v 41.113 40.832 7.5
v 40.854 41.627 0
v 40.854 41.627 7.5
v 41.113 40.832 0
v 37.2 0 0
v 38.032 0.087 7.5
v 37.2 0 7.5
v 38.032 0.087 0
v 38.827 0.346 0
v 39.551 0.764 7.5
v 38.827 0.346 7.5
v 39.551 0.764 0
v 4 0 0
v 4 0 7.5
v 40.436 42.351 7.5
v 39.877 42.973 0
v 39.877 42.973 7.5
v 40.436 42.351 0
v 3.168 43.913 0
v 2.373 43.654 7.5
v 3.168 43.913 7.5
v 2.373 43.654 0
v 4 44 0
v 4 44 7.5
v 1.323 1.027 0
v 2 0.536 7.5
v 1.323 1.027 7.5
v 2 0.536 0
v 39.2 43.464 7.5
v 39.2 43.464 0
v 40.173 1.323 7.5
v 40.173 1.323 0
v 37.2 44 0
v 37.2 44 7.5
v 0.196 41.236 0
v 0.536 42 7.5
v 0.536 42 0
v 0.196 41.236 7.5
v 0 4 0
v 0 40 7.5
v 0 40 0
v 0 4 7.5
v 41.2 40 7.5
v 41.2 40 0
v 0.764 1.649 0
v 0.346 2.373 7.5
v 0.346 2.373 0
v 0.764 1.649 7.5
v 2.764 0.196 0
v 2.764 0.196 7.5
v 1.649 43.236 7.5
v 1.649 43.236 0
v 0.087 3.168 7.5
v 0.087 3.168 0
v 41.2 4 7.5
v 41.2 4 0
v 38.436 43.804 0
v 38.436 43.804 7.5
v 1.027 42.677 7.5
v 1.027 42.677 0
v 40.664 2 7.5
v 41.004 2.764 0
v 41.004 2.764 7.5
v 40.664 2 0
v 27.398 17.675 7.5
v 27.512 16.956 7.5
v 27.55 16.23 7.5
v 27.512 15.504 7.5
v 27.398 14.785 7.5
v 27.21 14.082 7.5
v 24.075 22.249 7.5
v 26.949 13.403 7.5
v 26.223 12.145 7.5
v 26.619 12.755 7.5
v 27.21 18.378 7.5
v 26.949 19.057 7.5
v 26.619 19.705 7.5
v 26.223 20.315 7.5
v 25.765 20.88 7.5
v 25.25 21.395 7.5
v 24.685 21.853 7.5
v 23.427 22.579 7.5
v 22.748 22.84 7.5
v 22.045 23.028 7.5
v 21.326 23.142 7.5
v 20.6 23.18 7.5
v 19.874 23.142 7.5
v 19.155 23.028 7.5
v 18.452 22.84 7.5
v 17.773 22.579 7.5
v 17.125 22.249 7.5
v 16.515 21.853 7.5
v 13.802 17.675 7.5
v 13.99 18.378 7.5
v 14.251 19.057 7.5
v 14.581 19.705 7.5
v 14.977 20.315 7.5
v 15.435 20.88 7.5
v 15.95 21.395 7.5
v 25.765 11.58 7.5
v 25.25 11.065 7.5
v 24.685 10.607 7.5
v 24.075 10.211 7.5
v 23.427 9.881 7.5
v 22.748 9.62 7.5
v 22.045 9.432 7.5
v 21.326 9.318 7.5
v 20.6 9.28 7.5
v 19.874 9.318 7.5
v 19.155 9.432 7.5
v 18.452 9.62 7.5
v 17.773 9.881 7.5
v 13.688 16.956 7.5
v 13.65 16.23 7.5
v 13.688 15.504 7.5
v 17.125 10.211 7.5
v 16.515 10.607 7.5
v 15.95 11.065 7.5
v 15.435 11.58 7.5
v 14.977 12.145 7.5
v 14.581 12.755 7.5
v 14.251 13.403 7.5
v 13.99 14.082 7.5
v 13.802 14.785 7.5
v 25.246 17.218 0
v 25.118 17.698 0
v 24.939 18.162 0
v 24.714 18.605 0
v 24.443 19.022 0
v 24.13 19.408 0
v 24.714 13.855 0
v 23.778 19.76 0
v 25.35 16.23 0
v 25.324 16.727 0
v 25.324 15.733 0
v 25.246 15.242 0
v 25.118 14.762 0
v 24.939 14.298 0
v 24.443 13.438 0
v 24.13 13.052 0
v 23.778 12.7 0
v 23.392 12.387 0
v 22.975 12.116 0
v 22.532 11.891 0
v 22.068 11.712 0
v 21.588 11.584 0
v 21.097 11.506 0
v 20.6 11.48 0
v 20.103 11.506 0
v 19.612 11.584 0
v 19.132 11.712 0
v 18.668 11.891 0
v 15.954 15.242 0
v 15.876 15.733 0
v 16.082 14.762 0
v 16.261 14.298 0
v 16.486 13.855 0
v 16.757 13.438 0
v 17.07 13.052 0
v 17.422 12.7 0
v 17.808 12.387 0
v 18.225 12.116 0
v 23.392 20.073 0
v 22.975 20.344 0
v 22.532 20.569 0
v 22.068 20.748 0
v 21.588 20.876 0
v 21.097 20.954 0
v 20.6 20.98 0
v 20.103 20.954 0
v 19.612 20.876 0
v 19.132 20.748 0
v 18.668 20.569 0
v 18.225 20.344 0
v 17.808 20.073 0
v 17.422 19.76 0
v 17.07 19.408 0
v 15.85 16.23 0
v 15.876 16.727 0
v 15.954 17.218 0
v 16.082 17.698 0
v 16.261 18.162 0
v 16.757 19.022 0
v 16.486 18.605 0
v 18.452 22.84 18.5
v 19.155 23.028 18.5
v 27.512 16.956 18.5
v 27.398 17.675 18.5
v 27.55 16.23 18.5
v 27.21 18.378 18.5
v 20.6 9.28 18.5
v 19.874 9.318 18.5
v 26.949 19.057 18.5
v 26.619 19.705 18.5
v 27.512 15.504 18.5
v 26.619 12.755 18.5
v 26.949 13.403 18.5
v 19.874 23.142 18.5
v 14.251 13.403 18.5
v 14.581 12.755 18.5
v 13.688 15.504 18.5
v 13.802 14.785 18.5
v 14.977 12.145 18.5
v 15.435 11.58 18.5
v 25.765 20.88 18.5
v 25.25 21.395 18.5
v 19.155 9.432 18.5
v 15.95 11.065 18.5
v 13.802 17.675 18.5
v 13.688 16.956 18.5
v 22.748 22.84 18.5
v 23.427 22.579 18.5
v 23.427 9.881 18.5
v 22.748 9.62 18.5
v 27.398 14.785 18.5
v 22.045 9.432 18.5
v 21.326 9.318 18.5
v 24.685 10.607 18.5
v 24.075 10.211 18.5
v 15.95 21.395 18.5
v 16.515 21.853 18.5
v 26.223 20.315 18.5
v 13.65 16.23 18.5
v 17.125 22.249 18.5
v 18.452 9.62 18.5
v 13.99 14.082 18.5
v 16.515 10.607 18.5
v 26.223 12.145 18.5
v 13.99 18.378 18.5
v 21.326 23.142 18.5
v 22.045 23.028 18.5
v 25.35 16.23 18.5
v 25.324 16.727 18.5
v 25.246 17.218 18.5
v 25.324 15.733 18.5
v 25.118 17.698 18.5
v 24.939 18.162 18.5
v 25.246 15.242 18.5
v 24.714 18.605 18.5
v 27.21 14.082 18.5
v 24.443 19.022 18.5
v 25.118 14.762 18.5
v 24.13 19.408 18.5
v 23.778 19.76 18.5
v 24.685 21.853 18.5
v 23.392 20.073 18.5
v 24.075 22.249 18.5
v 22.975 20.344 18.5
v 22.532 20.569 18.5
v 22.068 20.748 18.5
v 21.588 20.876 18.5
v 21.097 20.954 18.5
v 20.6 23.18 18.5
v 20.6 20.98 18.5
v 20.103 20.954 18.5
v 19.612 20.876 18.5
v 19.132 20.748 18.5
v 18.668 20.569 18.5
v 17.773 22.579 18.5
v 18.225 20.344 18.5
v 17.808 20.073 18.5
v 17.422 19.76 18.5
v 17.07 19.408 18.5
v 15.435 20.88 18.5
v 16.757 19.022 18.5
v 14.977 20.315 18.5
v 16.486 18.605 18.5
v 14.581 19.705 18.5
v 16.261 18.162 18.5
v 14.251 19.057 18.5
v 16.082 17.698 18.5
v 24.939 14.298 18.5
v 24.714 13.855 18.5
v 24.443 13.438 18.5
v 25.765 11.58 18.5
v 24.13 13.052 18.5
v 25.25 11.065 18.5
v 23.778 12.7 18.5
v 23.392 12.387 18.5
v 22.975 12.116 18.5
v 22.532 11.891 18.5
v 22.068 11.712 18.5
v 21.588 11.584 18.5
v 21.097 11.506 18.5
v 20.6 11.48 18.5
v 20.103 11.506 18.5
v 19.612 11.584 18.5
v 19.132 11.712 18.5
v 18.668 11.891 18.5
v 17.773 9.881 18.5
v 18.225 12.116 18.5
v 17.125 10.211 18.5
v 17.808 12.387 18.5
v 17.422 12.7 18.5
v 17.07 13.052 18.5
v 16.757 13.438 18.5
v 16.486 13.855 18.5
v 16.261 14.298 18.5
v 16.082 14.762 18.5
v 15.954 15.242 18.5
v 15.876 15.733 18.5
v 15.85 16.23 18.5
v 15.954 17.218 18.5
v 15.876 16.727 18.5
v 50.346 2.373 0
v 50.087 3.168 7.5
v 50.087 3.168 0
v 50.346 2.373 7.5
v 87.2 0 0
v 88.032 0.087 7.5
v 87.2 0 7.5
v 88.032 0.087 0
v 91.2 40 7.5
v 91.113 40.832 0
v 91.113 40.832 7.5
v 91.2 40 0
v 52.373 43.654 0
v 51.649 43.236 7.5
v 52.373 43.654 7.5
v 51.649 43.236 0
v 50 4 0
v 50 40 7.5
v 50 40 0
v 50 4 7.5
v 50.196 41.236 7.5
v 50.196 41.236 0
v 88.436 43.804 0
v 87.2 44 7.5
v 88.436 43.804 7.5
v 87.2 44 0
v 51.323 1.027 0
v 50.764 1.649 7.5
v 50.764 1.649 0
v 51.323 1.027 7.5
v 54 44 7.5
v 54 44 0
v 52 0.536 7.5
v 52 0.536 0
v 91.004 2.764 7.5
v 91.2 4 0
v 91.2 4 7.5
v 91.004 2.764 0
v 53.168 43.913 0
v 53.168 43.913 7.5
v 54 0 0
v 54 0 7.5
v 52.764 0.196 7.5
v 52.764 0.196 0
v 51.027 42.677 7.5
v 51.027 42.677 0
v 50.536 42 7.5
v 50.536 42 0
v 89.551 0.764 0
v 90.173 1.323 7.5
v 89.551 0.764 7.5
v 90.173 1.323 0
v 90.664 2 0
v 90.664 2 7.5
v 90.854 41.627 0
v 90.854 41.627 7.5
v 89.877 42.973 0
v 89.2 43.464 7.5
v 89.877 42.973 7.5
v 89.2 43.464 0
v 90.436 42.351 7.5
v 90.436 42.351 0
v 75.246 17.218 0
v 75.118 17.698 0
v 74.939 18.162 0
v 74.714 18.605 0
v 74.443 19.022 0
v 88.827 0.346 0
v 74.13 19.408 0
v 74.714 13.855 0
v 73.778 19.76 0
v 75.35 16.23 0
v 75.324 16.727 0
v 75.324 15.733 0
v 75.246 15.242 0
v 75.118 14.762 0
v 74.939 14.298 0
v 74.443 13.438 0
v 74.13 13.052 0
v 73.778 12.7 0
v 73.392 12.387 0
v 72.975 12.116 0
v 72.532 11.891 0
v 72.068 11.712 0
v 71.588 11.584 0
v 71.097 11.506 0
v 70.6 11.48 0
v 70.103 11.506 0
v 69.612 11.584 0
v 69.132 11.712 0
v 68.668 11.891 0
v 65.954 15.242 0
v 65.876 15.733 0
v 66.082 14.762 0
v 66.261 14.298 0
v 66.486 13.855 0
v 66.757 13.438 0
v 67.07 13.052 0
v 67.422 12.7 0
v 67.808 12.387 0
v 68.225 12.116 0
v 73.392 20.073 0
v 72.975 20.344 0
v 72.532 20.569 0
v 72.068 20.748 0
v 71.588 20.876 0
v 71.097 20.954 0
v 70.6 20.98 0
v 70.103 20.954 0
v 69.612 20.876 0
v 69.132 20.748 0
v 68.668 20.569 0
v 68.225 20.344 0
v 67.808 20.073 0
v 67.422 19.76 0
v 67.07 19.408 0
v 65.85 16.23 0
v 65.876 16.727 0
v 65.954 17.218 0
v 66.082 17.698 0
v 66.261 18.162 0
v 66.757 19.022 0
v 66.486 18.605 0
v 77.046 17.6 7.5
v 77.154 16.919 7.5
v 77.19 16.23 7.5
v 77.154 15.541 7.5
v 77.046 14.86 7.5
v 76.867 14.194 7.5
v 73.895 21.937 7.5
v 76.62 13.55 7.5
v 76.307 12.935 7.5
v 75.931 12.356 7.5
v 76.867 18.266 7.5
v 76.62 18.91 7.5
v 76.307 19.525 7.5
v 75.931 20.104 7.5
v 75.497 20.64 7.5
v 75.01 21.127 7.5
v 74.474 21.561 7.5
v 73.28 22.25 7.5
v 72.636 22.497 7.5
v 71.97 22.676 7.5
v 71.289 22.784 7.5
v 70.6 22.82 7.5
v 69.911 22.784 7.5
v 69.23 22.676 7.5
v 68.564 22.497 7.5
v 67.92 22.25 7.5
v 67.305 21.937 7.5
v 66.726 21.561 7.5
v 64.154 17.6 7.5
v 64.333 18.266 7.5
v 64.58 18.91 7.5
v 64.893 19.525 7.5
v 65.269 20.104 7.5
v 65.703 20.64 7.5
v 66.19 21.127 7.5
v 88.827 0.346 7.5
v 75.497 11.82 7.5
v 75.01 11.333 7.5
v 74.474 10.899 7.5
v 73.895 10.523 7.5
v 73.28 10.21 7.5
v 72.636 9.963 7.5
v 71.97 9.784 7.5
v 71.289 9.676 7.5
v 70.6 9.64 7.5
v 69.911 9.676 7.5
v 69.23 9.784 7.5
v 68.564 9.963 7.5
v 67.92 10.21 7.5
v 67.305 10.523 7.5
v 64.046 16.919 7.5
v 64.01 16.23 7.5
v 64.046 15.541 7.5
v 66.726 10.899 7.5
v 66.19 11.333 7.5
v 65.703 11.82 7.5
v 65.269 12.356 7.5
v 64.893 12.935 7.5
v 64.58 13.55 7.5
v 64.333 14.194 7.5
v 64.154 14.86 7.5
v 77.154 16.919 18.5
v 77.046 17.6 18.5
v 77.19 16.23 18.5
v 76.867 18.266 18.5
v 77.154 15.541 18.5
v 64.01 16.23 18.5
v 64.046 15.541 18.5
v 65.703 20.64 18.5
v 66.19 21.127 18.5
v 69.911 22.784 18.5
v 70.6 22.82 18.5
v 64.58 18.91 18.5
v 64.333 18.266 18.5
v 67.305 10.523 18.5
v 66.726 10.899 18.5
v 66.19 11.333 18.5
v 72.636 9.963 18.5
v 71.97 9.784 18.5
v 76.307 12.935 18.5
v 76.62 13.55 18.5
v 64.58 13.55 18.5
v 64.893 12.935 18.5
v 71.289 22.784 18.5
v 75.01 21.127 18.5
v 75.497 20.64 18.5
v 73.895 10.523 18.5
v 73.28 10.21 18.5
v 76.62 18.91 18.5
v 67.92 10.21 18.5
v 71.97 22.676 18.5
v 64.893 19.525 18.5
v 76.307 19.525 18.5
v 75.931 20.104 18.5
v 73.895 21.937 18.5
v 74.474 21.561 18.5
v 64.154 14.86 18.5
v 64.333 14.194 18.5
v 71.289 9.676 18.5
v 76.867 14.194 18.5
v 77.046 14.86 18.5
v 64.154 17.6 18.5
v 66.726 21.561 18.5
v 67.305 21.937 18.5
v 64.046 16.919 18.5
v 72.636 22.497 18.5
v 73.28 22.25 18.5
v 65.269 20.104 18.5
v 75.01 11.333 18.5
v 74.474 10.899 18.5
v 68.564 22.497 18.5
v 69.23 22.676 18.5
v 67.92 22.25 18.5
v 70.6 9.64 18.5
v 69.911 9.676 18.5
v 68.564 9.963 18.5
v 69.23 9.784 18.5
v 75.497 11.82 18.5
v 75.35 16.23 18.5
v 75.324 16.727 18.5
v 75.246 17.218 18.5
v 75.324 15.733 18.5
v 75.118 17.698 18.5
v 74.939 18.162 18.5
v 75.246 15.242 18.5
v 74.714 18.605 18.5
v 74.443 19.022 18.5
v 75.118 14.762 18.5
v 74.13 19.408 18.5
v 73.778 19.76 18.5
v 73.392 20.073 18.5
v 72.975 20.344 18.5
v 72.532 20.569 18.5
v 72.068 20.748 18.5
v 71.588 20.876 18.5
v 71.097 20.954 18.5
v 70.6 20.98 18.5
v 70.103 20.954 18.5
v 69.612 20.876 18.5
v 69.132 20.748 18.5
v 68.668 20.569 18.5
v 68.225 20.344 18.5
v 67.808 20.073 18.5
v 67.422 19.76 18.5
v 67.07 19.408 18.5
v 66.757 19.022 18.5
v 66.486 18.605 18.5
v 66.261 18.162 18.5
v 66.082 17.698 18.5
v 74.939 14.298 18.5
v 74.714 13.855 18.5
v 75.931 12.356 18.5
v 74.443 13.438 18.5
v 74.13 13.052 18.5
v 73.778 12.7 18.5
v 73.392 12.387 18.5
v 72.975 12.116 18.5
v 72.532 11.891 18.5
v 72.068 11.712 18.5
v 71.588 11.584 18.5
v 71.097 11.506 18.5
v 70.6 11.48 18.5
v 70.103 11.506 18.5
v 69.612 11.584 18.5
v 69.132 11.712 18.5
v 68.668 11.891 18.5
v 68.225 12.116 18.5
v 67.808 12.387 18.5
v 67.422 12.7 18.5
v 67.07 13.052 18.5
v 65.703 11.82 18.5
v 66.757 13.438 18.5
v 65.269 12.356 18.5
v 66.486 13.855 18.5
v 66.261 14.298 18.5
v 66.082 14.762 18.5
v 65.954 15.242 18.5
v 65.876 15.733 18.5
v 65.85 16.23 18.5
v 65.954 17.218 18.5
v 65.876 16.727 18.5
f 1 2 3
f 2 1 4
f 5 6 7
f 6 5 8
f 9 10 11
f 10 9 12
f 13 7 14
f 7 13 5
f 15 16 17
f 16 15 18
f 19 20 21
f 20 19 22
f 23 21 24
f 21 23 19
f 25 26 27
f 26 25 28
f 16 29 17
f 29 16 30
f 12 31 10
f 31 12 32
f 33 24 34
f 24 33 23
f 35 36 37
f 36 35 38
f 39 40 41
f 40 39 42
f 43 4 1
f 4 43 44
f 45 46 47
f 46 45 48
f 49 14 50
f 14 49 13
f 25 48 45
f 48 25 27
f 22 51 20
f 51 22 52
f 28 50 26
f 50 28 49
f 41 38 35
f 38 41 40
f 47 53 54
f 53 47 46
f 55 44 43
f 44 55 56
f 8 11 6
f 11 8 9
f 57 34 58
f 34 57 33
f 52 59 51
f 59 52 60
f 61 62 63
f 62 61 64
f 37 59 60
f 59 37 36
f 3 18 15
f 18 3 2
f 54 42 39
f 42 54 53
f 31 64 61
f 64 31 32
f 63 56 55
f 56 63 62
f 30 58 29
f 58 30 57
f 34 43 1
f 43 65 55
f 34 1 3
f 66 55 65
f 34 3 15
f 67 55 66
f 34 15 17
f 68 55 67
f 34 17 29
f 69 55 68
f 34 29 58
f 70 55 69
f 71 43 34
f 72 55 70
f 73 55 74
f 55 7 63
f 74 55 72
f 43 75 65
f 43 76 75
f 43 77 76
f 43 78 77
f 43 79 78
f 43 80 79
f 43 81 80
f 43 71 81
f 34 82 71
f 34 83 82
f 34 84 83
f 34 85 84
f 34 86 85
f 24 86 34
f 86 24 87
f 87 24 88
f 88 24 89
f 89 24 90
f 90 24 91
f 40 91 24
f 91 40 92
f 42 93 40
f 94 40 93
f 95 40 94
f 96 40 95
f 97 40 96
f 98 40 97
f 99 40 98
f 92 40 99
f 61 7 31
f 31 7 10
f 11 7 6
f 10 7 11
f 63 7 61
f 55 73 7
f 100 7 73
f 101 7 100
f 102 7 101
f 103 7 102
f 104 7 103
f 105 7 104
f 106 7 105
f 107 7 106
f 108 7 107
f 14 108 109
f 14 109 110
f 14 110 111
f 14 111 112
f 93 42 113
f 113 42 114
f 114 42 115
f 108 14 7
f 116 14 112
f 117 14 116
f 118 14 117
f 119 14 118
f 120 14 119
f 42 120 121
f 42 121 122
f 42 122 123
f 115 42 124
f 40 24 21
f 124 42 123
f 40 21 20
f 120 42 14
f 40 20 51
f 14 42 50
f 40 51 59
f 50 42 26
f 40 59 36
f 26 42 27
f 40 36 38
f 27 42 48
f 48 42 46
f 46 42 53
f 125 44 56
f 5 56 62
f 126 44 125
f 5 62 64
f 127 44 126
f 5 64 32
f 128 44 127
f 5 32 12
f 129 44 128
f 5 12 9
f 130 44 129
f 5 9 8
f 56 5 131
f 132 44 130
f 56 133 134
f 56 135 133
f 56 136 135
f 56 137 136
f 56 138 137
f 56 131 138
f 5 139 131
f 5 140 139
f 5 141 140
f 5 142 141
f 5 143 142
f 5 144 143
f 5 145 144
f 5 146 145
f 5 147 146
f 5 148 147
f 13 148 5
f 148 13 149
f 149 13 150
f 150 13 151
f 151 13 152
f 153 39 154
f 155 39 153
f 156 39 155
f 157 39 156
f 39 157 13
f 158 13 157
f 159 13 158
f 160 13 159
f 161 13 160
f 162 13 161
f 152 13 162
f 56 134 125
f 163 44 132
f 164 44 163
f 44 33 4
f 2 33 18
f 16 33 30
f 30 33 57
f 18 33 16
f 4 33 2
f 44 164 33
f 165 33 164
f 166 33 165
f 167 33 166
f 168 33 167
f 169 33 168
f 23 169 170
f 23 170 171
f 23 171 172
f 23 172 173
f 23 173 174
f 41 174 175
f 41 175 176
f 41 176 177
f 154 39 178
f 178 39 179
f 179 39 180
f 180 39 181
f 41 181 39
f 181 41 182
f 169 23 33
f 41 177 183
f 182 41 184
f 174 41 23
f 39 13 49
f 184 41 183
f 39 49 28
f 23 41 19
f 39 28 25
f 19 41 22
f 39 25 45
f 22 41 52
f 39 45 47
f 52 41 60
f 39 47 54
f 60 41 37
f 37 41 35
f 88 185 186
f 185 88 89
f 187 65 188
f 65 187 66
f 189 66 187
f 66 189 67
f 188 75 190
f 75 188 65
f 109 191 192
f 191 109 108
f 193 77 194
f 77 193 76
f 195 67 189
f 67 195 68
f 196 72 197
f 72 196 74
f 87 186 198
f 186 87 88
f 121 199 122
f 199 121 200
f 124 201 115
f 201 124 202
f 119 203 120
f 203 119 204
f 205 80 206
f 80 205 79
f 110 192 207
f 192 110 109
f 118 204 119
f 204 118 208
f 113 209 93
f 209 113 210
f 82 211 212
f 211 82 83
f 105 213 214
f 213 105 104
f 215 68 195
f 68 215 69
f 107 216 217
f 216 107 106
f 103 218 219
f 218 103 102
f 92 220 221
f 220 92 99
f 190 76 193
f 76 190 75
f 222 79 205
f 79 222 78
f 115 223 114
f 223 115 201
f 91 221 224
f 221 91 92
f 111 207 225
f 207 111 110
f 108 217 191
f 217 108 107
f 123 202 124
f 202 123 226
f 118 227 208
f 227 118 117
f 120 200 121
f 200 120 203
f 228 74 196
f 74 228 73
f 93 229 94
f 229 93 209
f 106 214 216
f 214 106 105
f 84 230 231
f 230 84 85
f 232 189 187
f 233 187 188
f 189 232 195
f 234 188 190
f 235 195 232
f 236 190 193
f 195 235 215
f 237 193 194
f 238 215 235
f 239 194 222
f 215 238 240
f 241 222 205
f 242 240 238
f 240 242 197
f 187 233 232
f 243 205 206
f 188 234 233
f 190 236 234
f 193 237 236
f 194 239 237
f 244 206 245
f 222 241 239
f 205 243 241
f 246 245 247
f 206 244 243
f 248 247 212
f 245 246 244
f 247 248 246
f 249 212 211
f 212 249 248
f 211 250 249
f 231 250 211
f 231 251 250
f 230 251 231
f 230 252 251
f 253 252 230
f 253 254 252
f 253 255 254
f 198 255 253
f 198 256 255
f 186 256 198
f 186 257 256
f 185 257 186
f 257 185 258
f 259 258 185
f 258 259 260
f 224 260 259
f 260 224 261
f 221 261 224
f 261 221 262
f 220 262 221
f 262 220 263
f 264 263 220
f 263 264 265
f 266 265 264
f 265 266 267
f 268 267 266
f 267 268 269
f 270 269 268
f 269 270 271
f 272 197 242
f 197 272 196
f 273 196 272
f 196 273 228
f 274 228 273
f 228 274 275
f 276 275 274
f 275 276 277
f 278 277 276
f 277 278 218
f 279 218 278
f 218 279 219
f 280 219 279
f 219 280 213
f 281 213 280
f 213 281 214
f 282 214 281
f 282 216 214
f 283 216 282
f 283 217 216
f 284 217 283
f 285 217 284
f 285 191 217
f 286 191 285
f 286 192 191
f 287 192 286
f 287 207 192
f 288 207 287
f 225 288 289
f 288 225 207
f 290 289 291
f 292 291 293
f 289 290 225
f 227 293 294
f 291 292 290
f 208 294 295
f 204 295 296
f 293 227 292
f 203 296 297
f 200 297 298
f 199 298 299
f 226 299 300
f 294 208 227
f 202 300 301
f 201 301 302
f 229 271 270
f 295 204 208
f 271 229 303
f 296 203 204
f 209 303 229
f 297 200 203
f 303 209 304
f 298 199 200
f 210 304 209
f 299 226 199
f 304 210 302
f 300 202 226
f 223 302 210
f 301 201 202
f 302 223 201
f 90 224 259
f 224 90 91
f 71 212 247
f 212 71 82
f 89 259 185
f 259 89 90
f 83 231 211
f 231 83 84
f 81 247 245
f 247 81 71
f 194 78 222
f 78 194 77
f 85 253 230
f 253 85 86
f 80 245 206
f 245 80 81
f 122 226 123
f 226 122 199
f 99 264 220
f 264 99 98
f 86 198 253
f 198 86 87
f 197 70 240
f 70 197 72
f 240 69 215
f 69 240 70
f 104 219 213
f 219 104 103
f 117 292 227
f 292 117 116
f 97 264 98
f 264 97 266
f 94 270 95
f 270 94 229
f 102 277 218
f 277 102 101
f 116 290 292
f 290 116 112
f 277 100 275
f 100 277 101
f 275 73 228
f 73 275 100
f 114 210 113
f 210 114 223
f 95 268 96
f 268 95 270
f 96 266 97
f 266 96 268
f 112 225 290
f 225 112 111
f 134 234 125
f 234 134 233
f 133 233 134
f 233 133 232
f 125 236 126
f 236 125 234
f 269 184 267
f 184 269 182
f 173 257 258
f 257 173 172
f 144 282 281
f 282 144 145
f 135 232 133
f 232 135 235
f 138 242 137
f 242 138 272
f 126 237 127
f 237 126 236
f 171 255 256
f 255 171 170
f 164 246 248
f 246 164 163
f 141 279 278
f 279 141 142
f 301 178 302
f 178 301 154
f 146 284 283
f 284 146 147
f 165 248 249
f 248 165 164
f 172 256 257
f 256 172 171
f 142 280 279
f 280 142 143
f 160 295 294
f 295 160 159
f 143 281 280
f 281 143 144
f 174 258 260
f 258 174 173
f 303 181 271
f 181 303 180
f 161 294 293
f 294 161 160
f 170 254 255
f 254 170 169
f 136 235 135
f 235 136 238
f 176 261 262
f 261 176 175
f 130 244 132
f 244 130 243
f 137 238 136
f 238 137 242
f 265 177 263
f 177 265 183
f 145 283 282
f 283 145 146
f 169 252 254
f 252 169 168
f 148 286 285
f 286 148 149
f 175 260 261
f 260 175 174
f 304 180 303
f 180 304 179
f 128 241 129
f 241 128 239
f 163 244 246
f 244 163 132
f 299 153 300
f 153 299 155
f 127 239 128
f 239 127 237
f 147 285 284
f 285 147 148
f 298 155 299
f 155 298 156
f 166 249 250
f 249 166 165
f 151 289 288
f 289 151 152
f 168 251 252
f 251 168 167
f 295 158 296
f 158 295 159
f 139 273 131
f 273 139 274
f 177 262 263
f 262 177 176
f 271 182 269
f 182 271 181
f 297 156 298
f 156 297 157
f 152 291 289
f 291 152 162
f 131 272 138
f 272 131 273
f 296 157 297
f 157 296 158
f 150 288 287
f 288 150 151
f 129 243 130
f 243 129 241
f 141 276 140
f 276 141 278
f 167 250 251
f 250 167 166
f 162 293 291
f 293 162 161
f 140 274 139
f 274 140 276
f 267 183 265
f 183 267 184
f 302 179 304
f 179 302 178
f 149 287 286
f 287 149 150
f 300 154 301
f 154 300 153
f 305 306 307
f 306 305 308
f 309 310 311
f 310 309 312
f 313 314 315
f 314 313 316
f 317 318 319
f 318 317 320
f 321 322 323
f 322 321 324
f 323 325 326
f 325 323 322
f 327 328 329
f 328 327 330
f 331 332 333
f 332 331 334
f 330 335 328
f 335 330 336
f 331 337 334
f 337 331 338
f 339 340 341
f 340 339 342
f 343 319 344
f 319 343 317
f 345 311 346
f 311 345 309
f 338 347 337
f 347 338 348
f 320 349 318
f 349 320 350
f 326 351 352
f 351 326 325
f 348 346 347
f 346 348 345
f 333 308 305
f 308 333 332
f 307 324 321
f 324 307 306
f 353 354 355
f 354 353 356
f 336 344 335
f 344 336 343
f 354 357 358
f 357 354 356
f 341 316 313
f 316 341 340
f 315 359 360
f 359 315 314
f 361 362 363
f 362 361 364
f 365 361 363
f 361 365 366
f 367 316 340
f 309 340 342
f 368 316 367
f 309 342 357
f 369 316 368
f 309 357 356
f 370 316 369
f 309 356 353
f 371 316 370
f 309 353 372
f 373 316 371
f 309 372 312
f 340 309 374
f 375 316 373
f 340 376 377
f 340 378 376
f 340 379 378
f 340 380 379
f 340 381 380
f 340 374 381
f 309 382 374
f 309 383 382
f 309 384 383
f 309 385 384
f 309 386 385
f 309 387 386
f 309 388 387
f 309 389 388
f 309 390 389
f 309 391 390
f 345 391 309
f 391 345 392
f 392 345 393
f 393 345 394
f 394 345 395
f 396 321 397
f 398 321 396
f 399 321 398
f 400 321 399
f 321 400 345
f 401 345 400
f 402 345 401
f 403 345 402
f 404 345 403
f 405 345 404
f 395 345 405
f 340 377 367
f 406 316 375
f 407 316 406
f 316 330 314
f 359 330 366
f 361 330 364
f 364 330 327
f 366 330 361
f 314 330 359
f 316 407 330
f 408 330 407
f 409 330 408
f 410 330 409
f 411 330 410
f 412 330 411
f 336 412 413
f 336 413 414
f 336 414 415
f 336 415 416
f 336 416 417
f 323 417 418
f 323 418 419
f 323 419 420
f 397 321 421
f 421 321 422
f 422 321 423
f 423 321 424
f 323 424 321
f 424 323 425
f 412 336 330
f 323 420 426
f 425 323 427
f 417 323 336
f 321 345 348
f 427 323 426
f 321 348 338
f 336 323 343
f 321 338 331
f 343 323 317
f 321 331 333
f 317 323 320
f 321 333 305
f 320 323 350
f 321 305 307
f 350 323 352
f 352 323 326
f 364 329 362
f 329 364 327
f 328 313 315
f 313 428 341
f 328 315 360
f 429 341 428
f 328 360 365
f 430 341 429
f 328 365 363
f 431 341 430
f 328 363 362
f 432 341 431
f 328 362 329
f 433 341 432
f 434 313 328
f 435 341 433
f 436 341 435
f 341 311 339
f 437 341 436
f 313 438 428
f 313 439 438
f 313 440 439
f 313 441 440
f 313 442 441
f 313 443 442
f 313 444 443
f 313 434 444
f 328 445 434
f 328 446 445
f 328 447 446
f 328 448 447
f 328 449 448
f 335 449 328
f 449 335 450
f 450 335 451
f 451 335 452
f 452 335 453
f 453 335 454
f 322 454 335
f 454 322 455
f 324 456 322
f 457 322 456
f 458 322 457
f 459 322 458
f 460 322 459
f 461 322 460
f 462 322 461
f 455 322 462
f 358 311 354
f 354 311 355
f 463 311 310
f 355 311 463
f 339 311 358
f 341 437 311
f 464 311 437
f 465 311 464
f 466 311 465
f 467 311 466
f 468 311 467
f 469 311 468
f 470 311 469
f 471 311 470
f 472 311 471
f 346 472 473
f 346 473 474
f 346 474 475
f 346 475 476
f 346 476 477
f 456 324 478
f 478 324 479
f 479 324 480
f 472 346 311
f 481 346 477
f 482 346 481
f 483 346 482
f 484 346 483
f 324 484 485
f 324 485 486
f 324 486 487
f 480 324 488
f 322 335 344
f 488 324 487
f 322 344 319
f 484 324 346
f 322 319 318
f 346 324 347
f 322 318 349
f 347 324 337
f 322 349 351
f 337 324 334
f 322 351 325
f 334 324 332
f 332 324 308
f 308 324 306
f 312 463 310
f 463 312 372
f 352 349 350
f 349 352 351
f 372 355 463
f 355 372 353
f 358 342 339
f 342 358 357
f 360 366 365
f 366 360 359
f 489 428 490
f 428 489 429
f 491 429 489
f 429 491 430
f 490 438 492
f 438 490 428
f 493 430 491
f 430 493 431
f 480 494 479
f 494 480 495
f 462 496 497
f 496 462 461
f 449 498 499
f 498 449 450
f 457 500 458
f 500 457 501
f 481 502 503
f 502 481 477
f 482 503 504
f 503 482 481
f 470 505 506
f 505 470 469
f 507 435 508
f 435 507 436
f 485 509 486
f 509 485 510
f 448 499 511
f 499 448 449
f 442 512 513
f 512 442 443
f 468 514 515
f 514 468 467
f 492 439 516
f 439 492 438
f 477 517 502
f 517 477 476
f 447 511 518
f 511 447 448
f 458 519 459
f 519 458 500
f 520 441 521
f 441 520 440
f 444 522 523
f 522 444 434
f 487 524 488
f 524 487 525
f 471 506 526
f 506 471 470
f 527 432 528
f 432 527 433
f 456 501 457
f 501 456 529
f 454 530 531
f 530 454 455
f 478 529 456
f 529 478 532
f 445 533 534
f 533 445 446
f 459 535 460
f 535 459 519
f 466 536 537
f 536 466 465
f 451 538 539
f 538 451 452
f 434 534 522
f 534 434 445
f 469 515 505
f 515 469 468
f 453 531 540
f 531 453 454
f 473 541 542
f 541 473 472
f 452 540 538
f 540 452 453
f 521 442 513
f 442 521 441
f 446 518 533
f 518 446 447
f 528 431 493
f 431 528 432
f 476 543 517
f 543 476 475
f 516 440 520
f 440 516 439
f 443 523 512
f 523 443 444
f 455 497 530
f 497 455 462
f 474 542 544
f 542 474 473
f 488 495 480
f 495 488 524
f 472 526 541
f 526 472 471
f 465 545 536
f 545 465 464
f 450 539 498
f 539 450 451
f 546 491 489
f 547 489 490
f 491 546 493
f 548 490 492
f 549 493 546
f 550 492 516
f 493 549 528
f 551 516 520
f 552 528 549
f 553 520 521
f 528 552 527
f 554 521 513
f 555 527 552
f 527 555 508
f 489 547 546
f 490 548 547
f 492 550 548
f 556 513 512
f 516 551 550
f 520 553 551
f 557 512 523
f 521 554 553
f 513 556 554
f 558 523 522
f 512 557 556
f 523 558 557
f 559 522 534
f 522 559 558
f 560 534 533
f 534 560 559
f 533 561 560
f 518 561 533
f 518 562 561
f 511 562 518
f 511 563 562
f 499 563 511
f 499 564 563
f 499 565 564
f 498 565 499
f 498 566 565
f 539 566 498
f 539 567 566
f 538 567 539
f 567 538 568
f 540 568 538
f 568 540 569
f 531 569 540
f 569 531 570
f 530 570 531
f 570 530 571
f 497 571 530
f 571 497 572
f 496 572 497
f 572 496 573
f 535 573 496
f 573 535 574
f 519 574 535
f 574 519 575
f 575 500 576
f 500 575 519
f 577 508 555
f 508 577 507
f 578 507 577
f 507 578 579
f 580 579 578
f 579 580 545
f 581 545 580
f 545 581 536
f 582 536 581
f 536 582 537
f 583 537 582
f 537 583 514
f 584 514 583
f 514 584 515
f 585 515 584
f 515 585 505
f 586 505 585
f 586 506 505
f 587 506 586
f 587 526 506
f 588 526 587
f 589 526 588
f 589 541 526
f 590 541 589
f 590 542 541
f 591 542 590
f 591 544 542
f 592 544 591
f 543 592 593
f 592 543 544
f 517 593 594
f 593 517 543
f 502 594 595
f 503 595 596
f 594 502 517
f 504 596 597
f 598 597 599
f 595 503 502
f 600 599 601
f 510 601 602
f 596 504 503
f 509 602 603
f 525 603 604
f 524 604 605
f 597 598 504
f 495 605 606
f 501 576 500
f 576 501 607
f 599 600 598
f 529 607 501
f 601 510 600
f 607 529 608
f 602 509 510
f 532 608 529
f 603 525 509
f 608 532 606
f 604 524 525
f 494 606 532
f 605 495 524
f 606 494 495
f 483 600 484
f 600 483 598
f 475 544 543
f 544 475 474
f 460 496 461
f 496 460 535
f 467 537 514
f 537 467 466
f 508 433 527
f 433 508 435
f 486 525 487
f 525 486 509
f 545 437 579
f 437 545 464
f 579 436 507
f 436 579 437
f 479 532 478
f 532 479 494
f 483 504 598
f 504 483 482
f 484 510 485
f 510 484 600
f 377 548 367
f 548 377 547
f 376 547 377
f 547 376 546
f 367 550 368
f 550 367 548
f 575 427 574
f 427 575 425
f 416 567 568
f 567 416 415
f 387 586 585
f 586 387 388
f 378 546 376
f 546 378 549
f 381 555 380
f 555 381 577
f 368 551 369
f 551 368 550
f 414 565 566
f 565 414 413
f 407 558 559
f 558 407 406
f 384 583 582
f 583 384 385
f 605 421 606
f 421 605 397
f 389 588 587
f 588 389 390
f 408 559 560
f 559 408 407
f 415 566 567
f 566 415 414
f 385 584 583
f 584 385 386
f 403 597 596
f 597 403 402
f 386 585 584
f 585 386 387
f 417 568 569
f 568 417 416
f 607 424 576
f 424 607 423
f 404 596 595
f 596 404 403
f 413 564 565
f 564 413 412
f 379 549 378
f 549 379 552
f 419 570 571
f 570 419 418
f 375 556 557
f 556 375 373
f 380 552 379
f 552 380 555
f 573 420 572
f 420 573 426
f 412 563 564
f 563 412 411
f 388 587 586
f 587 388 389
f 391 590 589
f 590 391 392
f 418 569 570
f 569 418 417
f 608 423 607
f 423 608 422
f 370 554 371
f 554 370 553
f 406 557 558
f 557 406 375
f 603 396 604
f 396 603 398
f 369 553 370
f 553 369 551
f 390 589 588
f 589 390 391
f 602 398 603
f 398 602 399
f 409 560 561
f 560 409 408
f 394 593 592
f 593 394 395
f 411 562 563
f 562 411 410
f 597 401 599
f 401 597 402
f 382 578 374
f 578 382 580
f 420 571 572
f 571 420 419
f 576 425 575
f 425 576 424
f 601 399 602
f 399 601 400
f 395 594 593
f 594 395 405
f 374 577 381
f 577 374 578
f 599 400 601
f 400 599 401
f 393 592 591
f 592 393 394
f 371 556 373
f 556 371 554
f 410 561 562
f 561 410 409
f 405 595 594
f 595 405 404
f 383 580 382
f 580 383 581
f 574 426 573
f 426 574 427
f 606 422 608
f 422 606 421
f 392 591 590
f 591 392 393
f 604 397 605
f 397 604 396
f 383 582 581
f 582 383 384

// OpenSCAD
//use <otherPeoplesWork/threads-scad/threads.scad>
use <myTools.scad>

/* [Hidden] */

x = 41.2; // TOILET 
y = 60.0 - 16; // TOILET
z = 7.5; 

$fn=60;   //circle quantize 360/10=36 degrees per side

// container for the TOILET
TOILET_outside = [ x, y, z];

BOLT_DIA=9.5;


module build_TOILET(POST_DIA = 20)
{
    difference()
    {
        union()
        {
            // container for the TOILET
            abox( TOILET_outside, thick = -2, 
                    round_out=4, 
                    bSolid = true, 
                    bCentered = false);
                    
            translate ([x/2  , 11.48 + BOLT_DIA/2, TOILET_outside.z])
            cylinder(d = POST_DIA, h = 13 - 2, center = false);
        
                    
        }
        
        translate ([x/2  , 11.48 + BOLT_DIA/2, -.1])
        cylinder(d = BOLT_DIA, h = 50, center = false);
        
    }
 }

build_TOILET(POST_DIA = 13.90);
translate([ 50, 0, 0])
build_TOILET(POST_DIA = 13.18);
